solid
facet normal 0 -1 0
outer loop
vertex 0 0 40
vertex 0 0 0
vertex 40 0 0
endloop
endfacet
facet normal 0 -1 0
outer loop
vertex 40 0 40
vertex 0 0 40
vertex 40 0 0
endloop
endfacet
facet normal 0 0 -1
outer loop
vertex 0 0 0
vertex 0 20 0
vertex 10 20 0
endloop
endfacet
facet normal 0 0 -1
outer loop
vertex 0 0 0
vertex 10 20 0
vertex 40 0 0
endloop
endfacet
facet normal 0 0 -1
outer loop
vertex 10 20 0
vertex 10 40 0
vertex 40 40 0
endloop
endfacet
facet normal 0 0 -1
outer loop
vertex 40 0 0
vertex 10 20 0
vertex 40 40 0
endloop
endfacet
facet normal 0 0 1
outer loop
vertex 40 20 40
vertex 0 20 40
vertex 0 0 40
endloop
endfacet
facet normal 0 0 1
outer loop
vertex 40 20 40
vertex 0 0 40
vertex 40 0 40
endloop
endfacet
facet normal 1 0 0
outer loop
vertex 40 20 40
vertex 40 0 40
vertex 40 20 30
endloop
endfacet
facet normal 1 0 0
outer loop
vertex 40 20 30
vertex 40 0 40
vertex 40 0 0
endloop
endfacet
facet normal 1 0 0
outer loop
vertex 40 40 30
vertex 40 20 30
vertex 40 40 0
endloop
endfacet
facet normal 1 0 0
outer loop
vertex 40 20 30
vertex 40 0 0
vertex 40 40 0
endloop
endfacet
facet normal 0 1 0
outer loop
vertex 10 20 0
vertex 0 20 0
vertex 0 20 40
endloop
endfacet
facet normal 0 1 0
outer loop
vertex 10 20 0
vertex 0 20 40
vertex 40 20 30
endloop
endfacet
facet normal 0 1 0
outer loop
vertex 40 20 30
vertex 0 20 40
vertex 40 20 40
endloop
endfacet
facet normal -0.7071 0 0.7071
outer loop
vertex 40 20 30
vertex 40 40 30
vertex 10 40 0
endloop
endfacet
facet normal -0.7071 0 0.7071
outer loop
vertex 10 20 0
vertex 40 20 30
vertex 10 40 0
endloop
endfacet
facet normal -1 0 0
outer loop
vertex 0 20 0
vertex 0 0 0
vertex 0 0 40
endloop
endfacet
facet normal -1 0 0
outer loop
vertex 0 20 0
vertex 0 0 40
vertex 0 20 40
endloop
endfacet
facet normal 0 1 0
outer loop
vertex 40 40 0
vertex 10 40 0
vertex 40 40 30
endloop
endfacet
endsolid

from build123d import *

# Parameters (mm, degrees)
SKETCH1_W           = 40
SKETCH1_H           = 40
BOSS_EXTRUDE1_DEPTH = 40
SKETCH2_W           = 10
SKETCH2_H           = 20
CUT_EXTRUDE1_DEPTH  = 40
CUT_EXTRUDE3_DEPTH  = 20


with BuildPart() as part:
    # Sketch1 → Boss-Extrude1 (new body)
    with BuildSketch(Plane.XY):
        with Locations((20, 20)):
            Rectangle(SKETCH1_W, SKETCH1_H)
    extrude(amount=BOSS_EXTRUDE1_DEPTH)

    # Sketch2 → Cut-Extrude1 (cut)
    with BuildSketch(Plane.XY.offset(40)):
        with Locations((5, 30)):
            Rectangle(SKETCH2_W, SKETCH2_H)
    extrude(amount=-CUT_EXTRUDE1_DEPTH, mode=Mode.SUBTRACT)

    # Sketch3 → Cut-Extrude3 (cut)
    with BuildSketch(Plane(origin=(0, 40, 0), x_dir=(1, 0, 0), z_dir=(0, 1, 0))):
        Polygon((40, -30), (10, 0), (10, -40), (40, -40), align=None)
    extrude(amount=-CUT_EXTRUDE3_DEPTH, mode=Mode.SUBTRACT)


solid = part.part
